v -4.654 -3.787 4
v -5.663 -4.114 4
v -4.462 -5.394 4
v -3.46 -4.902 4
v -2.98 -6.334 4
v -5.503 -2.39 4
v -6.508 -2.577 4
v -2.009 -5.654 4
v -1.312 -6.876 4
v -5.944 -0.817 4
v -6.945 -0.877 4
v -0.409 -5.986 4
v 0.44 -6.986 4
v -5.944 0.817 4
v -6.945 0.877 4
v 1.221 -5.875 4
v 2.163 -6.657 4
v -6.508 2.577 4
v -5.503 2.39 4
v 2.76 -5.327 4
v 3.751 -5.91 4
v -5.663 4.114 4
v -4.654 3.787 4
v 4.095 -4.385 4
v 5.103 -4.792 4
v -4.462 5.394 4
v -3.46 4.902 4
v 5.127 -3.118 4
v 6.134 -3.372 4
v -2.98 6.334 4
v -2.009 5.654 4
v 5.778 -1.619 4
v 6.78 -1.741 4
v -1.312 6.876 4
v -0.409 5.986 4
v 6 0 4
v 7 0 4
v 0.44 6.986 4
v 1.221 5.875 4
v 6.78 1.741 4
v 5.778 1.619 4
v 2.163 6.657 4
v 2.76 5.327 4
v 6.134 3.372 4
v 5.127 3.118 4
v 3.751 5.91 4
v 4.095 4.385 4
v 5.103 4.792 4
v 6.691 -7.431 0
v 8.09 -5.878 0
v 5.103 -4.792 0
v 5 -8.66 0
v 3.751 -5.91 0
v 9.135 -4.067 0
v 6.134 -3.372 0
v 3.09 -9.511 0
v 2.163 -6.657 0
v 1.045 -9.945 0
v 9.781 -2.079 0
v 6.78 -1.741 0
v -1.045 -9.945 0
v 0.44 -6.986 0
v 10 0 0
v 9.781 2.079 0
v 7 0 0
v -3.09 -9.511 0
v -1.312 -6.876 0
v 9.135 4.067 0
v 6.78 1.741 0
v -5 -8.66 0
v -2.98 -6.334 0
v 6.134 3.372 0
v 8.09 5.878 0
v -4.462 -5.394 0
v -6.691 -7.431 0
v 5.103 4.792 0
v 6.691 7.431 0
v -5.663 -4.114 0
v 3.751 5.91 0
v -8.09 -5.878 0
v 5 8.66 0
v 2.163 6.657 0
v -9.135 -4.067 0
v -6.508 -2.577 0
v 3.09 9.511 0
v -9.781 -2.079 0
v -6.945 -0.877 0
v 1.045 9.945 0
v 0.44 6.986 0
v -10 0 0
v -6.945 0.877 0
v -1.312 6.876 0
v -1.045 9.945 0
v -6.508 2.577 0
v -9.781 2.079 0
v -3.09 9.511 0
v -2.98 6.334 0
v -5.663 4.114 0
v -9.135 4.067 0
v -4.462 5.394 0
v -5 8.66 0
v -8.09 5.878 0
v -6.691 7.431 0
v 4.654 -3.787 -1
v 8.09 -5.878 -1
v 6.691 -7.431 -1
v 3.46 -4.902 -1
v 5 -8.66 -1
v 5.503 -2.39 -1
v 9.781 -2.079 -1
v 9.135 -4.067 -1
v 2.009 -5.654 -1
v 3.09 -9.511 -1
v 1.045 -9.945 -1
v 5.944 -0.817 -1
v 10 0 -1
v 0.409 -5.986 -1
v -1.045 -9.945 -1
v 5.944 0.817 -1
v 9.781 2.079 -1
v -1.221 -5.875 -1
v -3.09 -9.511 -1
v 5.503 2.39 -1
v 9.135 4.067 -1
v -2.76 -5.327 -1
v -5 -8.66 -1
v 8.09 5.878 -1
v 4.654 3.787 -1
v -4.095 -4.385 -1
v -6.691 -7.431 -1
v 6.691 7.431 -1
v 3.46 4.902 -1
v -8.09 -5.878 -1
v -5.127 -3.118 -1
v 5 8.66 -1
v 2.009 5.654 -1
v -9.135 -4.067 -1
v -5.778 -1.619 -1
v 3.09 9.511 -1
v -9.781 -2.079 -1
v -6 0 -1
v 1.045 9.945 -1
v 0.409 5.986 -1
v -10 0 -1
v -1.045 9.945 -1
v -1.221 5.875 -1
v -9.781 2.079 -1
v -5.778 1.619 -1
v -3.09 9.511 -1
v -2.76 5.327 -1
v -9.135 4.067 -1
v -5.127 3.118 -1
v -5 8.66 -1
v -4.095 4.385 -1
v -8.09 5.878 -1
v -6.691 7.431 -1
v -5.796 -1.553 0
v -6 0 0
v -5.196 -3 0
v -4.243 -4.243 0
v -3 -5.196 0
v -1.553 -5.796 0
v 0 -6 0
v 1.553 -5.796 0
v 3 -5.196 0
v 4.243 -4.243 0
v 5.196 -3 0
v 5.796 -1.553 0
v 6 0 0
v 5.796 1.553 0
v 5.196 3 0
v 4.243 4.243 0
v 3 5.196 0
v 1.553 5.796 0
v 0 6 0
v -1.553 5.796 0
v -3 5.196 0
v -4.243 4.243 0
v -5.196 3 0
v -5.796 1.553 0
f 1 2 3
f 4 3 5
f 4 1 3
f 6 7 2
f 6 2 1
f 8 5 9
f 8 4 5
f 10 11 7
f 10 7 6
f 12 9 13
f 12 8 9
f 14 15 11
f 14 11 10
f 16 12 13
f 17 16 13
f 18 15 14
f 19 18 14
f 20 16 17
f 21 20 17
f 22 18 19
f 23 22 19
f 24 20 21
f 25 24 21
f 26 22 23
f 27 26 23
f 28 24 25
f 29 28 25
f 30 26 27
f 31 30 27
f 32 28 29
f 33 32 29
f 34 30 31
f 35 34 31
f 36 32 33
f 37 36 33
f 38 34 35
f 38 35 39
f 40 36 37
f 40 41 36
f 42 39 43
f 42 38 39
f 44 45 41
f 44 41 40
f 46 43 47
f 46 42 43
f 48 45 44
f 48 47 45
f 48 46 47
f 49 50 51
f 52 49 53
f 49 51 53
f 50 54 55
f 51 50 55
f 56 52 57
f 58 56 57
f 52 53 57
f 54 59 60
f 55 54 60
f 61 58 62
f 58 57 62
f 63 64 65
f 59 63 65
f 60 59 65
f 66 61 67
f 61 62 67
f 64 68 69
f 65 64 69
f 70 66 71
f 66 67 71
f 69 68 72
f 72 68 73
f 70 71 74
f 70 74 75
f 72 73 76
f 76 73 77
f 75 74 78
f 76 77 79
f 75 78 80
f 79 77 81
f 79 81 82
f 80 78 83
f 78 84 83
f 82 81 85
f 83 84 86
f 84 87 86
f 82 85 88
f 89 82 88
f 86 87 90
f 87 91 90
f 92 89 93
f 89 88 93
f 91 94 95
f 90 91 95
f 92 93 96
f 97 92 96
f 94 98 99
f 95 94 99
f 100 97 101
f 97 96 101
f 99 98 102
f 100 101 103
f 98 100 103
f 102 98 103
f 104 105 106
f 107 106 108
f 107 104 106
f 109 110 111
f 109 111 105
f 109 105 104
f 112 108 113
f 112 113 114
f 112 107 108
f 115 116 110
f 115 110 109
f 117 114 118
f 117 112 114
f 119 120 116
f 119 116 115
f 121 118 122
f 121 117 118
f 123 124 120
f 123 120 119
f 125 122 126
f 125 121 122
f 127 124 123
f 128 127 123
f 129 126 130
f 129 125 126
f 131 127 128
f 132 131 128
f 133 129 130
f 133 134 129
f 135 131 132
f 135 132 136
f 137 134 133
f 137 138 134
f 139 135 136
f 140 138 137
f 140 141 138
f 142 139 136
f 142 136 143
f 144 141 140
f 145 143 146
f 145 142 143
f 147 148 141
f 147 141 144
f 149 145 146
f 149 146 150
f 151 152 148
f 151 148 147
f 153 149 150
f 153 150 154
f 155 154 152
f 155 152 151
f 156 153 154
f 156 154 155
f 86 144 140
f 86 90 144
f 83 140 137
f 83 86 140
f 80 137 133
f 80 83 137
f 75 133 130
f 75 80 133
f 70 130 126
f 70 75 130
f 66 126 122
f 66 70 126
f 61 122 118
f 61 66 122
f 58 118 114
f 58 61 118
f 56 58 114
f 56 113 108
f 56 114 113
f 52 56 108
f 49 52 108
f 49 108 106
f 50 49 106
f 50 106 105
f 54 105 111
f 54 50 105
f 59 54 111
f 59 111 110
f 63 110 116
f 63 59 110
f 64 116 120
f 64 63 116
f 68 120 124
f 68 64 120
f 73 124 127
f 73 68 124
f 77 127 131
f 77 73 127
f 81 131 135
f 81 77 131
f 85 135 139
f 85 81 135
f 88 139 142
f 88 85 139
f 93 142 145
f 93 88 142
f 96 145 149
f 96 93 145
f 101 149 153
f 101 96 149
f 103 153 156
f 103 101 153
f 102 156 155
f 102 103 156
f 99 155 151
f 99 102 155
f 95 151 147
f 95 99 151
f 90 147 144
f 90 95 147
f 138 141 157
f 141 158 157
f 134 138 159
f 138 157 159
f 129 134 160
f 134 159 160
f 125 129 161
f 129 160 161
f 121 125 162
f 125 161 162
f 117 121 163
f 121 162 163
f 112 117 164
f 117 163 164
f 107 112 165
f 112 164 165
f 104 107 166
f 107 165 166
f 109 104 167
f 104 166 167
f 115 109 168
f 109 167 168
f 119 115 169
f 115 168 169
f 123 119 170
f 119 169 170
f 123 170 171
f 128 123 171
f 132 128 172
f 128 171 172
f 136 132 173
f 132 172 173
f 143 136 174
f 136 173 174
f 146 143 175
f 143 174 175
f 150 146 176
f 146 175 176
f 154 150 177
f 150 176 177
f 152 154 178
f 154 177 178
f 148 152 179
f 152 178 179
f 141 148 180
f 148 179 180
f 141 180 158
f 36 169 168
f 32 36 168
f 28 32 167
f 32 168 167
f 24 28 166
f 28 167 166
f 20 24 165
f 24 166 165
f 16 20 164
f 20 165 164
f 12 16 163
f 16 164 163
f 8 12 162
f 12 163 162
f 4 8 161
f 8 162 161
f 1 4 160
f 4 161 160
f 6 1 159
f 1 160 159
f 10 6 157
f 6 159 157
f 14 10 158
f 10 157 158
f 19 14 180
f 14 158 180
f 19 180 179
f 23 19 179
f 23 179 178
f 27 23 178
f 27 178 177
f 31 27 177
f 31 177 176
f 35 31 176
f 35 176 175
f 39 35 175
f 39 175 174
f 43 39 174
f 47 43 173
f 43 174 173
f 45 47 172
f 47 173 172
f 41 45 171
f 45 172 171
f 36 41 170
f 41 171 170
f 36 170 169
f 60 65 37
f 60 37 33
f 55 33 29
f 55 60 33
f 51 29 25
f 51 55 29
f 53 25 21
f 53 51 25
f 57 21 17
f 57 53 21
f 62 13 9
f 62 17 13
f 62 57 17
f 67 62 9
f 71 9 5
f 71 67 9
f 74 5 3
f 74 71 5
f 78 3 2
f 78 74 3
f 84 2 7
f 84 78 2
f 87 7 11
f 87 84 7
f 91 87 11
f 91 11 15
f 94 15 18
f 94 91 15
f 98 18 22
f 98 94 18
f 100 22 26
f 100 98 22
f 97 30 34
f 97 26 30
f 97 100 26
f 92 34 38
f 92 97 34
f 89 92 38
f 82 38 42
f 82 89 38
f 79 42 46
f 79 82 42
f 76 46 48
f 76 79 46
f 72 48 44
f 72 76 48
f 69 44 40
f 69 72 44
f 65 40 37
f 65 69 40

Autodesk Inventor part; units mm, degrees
ref_plane "YZ Plane" through (0, 0, 0) normal (1, 0, 0) x (0, 1, 0)
ref_plane "XZ Plane" through (0, 0, 0) normal (0, 1, 0) x (-1, 0, 0)
ref_plane "XY Plane" through (0, 0, 0) normal (0, 0, 1) x (1, 0, 0)
sketch "スケッチ1" plane through (0, 0, 0) normal (0, 0, 1) x (1, 0, 0)
  circle A0 centre (0, 0) radius 6
  circle A1 centre (0, 0) radius 7
  dimension "d0" = 12
  dimension "d1" = 14
extrude "押し出し1" add sketch "スケッチ1" along normal blind 4
sketch "スケッチ2" plane through (0, 0, 0) normal (0, 0, -1) x (-1, 0, 0)
  circle A0 centre (0, 0) radius 7 projected
  circle A1 centre (0, 0) radius 6 projected
  circle A2 centre (0, 0) radius 10
  dimension "d4" = 20
extrude "押し出し2" add sketch "スケッチ2" along normal blind 1 contours A0 | A2
properties part number "オイレスフランジ付き12142004" material "アセタール樹脂、黒"
